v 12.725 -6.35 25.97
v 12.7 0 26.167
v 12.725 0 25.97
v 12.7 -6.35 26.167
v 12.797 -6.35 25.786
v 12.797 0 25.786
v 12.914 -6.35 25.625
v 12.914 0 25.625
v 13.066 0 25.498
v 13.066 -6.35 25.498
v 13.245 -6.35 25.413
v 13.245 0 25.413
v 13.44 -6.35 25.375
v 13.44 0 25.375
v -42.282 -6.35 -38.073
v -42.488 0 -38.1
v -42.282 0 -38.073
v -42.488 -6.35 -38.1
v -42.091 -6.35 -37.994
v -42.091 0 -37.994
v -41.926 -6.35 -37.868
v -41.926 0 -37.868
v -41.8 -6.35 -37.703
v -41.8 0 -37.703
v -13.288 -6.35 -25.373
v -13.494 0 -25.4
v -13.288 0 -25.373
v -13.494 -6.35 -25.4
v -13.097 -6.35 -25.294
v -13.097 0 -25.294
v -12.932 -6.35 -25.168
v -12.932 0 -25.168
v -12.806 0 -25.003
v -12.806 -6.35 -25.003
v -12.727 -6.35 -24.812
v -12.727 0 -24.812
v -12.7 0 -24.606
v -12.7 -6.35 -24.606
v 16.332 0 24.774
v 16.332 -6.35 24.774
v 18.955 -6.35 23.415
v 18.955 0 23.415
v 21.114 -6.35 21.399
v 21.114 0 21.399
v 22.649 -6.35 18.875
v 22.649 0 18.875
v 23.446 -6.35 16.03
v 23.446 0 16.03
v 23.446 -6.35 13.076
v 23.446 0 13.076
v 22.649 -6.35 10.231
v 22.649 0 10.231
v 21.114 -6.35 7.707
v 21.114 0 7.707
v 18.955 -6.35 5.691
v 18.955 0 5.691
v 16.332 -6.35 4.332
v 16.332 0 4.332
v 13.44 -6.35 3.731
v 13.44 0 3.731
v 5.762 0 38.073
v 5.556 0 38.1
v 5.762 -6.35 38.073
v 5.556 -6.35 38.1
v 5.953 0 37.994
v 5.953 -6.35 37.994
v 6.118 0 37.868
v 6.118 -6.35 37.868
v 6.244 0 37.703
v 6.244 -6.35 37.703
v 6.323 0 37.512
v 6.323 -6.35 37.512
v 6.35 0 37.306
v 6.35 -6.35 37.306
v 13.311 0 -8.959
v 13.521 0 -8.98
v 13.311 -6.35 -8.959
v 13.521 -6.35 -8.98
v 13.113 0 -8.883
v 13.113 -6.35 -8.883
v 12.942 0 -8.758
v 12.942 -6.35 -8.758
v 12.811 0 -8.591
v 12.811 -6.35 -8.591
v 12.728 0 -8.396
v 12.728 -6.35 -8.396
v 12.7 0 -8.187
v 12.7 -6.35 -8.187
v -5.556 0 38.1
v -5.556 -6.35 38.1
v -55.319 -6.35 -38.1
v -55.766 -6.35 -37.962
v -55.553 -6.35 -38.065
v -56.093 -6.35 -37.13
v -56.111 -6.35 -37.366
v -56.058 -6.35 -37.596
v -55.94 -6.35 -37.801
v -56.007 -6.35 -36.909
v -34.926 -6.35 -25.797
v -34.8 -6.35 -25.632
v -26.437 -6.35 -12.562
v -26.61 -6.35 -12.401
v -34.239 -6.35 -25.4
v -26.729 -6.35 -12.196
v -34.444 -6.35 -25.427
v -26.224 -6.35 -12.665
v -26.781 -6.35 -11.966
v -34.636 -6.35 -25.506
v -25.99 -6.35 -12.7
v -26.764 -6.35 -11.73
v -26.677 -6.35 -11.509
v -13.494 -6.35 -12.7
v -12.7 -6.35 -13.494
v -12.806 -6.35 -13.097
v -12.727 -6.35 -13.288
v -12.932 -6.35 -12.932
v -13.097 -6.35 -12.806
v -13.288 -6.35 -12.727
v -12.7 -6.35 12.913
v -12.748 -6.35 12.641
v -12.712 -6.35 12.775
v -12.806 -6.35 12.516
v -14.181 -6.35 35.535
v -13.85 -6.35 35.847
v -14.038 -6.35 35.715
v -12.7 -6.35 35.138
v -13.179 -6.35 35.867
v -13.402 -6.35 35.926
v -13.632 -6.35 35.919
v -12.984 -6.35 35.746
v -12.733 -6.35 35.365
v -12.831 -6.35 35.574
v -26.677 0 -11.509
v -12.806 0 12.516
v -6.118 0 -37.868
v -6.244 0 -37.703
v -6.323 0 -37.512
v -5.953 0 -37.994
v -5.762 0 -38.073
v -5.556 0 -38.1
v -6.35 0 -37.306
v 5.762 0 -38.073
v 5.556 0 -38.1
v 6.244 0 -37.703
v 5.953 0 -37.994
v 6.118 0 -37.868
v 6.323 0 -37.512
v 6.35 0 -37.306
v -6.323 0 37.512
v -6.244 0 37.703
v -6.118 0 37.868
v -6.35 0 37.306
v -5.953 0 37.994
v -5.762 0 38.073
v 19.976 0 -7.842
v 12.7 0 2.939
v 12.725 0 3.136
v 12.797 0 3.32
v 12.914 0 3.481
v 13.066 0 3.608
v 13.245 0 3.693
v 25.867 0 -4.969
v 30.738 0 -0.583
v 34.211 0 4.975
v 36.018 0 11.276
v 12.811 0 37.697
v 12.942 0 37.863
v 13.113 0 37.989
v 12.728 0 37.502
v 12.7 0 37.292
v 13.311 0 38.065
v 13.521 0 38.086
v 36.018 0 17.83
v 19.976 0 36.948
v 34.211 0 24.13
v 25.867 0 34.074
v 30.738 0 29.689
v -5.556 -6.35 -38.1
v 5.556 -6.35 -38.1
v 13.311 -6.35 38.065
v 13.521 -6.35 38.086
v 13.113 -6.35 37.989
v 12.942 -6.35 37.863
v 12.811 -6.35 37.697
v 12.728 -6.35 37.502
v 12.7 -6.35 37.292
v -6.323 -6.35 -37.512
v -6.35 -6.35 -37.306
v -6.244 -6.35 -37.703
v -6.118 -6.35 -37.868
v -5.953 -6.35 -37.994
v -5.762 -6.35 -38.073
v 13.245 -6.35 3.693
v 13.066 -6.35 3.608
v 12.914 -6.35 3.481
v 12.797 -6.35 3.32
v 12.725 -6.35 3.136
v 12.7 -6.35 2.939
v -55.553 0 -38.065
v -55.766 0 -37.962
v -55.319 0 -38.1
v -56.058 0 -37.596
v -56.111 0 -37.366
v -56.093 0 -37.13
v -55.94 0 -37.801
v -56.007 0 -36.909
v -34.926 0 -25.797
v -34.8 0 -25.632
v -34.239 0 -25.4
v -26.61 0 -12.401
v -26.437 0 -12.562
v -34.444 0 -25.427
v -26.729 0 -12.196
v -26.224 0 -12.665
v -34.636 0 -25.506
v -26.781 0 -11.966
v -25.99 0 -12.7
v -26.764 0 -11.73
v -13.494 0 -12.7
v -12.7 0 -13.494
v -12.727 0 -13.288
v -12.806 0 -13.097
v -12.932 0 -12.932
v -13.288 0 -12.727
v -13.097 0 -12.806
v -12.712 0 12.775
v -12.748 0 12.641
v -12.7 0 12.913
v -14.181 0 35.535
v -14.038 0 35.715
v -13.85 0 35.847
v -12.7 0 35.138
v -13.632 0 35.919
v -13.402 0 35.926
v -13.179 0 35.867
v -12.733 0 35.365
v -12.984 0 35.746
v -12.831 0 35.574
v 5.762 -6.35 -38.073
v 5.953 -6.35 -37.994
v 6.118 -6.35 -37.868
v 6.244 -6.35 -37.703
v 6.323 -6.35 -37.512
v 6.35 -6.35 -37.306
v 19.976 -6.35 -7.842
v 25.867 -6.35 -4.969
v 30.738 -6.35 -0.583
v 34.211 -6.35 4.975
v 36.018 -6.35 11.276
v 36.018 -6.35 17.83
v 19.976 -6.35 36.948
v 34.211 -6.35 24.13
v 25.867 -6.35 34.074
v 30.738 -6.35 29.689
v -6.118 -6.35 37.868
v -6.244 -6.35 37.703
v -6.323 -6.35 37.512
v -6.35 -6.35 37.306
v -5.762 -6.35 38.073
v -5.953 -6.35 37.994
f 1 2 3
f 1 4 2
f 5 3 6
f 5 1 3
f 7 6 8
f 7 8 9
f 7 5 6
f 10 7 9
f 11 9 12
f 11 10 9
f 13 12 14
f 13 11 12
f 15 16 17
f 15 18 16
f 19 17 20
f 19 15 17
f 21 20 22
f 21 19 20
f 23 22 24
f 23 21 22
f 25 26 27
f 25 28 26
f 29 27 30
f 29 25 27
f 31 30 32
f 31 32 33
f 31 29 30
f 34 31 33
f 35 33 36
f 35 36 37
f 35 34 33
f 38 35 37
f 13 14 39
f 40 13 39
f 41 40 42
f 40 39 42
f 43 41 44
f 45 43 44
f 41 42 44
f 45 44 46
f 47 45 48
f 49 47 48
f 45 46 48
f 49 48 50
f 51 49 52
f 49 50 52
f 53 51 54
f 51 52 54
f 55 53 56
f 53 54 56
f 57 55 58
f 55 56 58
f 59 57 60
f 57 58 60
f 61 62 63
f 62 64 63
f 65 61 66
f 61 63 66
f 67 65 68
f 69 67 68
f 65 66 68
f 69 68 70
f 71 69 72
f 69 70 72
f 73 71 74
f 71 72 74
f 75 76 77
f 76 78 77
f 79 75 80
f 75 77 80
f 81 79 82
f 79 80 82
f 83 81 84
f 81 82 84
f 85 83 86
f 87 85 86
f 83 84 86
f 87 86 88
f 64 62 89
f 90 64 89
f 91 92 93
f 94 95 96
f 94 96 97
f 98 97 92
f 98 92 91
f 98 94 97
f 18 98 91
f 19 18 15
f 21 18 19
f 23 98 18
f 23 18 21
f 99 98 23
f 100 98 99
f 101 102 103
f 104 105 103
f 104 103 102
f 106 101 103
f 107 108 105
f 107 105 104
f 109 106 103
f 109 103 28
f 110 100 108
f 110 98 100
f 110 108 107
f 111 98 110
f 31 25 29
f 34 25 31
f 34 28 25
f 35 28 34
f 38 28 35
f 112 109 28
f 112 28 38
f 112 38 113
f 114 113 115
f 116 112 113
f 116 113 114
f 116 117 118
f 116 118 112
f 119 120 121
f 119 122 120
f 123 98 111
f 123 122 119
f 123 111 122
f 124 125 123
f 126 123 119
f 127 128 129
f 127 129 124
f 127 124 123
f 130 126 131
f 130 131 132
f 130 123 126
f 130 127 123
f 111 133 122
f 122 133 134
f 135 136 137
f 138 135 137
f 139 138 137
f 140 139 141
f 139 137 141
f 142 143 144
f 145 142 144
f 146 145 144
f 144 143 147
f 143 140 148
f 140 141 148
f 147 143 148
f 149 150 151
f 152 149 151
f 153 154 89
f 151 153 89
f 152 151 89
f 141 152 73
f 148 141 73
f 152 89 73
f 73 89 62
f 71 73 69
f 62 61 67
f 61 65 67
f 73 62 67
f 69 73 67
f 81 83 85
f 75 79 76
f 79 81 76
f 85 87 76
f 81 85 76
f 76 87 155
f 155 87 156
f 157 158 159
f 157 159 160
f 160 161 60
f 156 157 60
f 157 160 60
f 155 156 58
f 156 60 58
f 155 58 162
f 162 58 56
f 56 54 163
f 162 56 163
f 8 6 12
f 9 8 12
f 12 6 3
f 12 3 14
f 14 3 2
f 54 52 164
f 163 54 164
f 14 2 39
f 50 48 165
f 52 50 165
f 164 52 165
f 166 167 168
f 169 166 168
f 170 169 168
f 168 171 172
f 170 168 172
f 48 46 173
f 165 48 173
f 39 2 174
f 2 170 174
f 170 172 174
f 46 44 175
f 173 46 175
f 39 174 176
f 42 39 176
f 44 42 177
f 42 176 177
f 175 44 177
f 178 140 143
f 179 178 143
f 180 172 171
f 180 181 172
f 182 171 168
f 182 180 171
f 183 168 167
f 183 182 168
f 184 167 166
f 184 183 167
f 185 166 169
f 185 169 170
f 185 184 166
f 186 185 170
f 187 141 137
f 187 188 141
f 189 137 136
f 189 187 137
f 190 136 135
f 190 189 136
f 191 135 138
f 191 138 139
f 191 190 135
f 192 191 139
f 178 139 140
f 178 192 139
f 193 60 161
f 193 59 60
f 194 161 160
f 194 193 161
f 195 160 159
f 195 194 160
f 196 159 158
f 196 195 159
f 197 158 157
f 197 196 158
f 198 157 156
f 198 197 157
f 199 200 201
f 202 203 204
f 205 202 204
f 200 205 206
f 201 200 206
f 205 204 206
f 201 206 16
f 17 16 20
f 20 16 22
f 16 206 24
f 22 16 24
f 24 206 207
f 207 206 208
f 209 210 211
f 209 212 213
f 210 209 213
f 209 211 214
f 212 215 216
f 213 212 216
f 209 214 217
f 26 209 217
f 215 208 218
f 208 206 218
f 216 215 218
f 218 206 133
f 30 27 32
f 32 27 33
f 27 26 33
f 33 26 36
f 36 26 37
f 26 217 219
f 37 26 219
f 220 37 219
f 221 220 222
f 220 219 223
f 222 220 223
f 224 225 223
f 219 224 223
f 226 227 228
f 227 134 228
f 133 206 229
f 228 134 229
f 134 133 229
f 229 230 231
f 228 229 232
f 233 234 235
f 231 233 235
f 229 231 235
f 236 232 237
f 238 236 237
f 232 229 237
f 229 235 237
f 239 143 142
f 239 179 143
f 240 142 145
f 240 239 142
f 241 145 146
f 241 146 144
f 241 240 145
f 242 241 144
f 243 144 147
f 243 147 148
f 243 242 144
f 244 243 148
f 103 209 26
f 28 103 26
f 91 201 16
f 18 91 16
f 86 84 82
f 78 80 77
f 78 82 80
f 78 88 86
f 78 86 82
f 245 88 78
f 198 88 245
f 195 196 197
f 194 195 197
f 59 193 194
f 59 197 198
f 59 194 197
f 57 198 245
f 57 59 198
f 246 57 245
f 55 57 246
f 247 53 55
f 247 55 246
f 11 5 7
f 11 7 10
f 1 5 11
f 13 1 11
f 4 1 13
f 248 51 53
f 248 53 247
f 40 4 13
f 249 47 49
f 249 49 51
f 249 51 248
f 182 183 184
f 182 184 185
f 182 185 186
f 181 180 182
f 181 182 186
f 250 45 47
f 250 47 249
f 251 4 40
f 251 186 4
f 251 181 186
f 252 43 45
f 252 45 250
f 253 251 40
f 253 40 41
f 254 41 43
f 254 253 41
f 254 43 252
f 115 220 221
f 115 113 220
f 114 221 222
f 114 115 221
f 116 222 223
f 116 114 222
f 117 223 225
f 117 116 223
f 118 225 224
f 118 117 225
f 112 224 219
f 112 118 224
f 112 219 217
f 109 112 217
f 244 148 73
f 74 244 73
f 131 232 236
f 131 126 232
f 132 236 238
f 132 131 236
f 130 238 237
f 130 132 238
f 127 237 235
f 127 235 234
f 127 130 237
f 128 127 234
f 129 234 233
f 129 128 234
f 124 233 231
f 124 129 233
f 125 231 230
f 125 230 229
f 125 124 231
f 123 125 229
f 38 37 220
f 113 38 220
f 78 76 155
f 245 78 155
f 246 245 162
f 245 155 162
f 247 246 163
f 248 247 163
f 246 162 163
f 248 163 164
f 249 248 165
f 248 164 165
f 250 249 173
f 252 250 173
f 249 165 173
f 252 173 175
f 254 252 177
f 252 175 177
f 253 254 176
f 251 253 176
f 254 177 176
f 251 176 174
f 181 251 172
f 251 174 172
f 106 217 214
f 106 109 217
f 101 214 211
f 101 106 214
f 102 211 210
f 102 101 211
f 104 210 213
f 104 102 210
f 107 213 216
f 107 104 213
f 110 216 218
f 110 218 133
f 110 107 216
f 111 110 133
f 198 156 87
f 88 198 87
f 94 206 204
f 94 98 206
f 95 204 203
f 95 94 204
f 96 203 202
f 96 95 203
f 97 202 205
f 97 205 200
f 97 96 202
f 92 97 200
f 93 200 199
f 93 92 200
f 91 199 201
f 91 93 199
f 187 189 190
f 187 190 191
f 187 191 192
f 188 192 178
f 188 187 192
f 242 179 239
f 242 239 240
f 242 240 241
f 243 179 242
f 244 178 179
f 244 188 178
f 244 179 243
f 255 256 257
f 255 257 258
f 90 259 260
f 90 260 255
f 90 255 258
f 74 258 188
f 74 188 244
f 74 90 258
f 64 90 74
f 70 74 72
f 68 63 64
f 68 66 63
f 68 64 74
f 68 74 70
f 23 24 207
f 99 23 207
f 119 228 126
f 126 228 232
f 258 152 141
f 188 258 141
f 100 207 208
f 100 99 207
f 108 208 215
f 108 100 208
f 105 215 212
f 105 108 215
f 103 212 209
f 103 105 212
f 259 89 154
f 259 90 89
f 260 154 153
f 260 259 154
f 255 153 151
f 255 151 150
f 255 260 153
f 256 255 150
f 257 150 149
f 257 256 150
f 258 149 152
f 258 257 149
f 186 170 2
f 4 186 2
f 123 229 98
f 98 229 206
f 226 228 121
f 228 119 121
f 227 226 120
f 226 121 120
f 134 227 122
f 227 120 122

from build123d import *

# Parameters (mm, degrees)
F2_DEPTH = 6.35
F3_R     = 0.79375
F3_2_R   = 0.79375
F3_3_R   = 0.79375


# Not quite as in the source:
# - a variable given as a bare number and used for a length is read in inches; the dataset says mm whatever the document's units were


with BuildPart() as f2:
    # F1 (on Front) → F2 (new body)
    with BuildSketch(Plane.XZ):
        Polygon((-12.7, 12.7), (-12.7, 38.1), (-56.6940905122, -38.1), (-42.0293936748, -38.1), (-34.6970452561, -25.4), (-27.3646968374, -12.7), align=None)
        Polygon((-12.7, -25.4), (-12.7, -12.7), (-27.3646968374, -12.7), (-34.6970452561, -25.4), align=None)
    extrude(amount=F2_DEPTH)

    # F3
    f3_edges = [f2.edges().sort_by_distance(p)[0] for p in [
        (-12.7, -3.175, 38.1),
        (-12.7, -3.175, 12.7),
        (-12.7, -3.175, -25.4),
        (-34.697045, -3.175, -25.4),
        (-42.029394, -3.175, -38.1),
        (-56.694091, -3.175, -38.1),
        (-27.364697, -3.175, -12.7),
        (-12.7, -3.175, -12.7),
    ]]
    fillet(f3_edges, radius=F3_R)


with BuildPart() as f2b:
    # F1 (on Front) → F2, piece 2 (new body)
    with BuildSketch(Plane.XZ):
        Polygon((6.35, 38.1), (-6.35, 38.1), (-6.35, 12.7), (-6.35, -12.7), (-6.35, -25.4), (-6.35, -38.1), (6.35, -38.1), (6.35, -8.9941899428), (6.35, 3.7058100572), (6.35, 25.4), align=None)
    extrude(amount=F2_DEPTH)

    # F3#2
    f3_2_edges = [f2b.edges().sort_by_distance(p)[0] for p in [
        (-6.35, -3.175, 38.1),
        (6.35, -3.175, 38.1),
        (-6.35, -3.175, -38.1),
        (6.35, -3.175, -38.1),
    ]]
    fillet(f3_2_edges, radius=F3_2_R)


with BuildPart() as f2c:
    # F1 (on Front) → F2, piece 3 (new body)
    with BuildSketch(Plane.XZ):
        with BuildLine():
            ThreePointArc((12.7, -8.9941899428), (36.2470949714, 14.5529050286), (12.7, 38.1))
            Line((12.7, 38.1), (12.7, 25.4))
            ThreePointArc((12.7, 25.4), (23.5470949714, 14.5529050286), (12.7, 3.7058100572))
            Line((12.7, 3.7058100573), (12.7, -8.9941899428))
        make_face()
    extrude(amount=F2_DEPTH)

    # F3#3
    f3_3_edges = [f2c.edges().sort_by_distance(p)[0] for p in [
        (12.7, -3.175, -8.99419),
        (12.7, -3.175, 3.70581),
        (12.7, -3.175, 25.4),
        (12.7, -3.175, 38.1),
    ]]
    fillet(f3_3_edges, radius=F3_3_R)


solid = Compound([f2.part, f2b.part, f2c.part])
